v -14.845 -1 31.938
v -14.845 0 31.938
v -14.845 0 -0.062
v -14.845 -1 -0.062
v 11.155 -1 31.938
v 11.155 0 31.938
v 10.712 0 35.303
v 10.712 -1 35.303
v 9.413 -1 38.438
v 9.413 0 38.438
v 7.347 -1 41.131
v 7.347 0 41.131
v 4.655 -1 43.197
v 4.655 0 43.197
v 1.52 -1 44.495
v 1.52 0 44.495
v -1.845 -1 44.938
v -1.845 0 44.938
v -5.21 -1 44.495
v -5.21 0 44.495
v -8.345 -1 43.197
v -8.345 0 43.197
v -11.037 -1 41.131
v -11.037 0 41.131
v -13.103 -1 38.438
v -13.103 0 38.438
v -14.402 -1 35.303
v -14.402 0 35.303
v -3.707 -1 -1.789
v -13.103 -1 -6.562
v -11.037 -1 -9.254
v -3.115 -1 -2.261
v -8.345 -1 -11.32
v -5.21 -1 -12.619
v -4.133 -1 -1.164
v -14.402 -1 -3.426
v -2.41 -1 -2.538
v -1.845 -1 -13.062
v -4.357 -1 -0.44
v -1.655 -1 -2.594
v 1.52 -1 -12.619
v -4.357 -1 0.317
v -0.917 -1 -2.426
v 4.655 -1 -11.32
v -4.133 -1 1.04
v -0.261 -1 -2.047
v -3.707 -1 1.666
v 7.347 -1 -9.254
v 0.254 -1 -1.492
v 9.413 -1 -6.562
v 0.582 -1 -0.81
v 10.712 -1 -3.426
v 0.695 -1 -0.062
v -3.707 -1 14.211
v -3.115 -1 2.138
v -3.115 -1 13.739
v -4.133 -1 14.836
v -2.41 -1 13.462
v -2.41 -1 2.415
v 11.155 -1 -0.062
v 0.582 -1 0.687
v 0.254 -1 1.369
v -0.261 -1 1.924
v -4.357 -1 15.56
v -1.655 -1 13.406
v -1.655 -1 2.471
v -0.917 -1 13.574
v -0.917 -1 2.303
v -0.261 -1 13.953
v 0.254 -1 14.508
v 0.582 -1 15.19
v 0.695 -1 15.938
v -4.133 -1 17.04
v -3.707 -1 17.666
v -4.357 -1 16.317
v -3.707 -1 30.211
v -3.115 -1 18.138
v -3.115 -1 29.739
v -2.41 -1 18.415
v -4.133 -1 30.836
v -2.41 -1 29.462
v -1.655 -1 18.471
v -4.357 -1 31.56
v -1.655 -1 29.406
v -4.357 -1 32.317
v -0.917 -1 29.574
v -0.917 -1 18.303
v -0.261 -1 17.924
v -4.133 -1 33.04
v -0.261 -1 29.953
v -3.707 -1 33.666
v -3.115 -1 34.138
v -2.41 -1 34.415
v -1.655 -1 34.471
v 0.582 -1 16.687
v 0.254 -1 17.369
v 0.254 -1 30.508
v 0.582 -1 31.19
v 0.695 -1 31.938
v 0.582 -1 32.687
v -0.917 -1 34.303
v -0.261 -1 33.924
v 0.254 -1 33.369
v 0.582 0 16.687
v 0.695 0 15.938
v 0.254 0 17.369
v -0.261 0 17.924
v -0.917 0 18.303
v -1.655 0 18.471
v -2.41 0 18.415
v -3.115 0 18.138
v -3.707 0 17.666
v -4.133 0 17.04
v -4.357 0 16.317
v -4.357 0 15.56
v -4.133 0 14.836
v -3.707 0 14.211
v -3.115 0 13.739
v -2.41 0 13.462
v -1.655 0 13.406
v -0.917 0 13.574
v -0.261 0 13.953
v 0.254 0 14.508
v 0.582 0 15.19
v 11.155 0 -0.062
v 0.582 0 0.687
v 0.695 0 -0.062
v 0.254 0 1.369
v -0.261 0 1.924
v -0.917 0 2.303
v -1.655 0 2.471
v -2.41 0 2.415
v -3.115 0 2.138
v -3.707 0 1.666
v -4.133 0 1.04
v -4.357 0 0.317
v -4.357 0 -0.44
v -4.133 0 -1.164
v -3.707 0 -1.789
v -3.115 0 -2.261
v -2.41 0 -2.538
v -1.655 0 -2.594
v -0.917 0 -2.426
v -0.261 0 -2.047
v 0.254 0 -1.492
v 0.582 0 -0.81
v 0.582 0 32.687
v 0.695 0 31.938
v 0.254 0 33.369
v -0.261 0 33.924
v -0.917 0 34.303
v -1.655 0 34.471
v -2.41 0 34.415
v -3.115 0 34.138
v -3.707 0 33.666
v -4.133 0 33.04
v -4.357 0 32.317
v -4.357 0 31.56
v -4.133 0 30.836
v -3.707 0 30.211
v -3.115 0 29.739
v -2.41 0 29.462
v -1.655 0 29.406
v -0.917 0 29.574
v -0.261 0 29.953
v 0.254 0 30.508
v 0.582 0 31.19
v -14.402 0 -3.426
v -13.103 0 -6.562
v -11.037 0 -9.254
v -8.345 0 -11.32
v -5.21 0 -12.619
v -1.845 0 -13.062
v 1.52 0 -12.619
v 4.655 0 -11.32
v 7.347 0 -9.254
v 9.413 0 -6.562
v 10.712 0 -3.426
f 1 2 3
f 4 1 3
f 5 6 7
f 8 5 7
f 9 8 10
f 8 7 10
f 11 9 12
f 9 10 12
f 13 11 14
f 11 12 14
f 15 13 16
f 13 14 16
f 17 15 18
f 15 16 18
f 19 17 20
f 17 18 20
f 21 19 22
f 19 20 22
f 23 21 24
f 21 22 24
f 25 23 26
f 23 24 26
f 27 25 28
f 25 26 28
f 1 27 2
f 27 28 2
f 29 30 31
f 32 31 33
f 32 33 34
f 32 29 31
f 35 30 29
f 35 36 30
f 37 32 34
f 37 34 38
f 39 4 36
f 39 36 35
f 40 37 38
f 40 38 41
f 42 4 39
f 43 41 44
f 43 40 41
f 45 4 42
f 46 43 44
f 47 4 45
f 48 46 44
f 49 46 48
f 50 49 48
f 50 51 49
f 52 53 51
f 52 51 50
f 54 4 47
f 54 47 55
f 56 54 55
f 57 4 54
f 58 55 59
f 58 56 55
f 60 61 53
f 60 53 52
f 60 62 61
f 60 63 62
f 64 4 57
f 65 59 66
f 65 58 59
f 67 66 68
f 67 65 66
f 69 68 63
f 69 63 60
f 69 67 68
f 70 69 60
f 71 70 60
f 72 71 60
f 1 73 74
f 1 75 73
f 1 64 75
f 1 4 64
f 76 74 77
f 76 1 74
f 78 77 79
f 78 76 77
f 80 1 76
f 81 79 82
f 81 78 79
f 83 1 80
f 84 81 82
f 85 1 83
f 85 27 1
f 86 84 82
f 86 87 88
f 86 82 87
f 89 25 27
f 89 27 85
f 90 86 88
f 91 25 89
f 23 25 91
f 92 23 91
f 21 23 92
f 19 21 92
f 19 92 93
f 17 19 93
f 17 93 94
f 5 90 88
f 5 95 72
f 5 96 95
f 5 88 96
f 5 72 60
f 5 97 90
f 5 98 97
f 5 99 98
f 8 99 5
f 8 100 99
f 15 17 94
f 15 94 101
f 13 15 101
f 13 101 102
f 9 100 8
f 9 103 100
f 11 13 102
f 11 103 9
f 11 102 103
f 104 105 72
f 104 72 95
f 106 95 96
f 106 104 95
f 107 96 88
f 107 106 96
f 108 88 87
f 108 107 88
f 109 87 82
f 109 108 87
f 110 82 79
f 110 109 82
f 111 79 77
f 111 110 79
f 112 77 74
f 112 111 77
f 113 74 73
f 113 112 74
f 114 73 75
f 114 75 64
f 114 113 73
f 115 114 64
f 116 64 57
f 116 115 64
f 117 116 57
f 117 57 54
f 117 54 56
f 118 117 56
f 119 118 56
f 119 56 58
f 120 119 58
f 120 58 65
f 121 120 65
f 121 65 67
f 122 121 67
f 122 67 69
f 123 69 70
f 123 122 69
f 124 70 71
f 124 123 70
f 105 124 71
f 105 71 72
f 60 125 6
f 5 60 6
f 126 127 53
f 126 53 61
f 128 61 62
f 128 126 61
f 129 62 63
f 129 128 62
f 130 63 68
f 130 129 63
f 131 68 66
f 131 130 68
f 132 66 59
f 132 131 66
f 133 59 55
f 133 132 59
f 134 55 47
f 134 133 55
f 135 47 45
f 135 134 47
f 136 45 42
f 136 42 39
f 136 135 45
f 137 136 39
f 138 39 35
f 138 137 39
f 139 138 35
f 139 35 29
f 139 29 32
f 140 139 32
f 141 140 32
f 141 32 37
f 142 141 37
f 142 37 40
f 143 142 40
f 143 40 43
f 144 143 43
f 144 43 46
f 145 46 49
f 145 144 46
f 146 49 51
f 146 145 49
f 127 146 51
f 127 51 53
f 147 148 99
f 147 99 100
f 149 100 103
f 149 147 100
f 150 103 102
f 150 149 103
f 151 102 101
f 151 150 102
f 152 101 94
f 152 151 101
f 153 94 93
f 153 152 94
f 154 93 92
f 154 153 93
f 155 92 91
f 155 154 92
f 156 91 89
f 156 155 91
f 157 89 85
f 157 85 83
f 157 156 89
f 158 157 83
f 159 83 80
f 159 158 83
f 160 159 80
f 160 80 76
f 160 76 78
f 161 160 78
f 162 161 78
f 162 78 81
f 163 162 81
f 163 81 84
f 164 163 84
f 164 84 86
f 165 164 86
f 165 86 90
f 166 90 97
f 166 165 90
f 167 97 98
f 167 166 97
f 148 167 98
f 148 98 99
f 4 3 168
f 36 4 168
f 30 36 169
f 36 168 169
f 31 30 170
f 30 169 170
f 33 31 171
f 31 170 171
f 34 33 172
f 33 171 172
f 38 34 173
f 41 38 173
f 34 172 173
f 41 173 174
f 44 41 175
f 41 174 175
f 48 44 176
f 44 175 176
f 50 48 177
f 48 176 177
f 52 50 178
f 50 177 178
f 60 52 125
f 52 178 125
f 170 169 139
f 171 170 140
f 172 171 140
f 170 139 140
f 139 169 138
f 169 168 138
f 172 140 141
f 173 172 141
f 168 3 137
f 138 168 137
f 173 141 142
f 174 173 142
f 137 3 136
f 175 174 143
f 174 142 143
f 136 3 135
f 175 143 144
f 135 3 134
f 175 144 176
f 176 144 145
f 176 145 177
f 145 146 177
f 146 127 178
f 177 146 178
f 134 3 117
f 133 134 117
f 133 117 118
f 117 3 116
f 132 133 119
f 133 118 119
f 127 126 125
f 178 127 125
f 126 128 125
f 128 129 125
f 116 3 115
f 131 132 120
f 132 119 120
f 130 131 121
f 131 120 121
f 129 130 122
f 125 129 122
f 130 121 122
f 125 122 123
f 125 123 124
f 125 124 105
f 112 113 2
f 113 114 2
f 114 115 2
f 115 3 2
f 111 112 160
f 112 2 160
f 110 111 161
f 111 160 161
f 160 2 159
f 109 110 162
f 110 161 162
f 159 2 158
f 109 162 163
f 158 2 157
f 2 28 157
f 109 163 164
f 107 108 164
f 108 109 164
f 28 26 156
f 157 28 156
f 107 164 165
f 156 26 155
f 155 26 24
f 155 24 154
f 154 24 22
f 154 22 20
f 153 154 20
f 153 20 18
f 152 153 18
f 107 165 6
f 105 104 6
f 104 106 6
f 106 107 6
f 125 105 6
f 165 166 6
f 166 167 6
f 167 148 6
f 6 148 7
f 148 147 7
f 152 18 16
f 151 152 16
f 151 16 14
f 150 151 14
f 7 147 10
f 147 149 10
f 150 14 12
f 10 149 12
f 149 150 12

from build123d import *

# Parameters (mm, degrees)
F0_R     = 2.54
F1_DEPTH = 1


with BuildPart() as f1:
    # F0 (on Front) → F1 (new body)
    with BuildSketch(Plane.XZ):
        with BuildLine():
            ThreePointArc((11.155105, 31.938435), (-1.844895, 18.938435), (-14.844895, 31.938435))
            Line((-14.844895, 31.938435), (-14.844895, -0.061565))
            ThreePointArc((-14.844895, -0.061565), (-1.844895, 12.938435), (11.155105, -0.061565))
            Line((11.155105, -0.061565), (11.155105, 31.938435))
        make_face()
        with Locations((-1.844895, 15.938435)):
            Circle(F0_R, mode=Mode.SUBTRACT)
        with BuildLine():
            ThreePointArc((11.155105, 31.938435), (-1.844895, 44.938435), (-14.844895, 31.938435))
            ThreePointArc((-14.844895, 31.938435), (-1.844895, 18.938435), (11.155105, 31.938435))
        make_face()
        with Locations((-1.844895, 31.938435)):
            Circle(F0_R, mode=Mode.SUBTRACT)
        with BuildLine():
            ThreePointArc((11.155105, -0.061565), (-1.844895, 12.938435), (-14.844895, -0.061565))
            ThreePointArc((-14.844895, -0.061565), (-1.844895, -13.061565), (11.155105, -0.061565))
        make_face()
        with Locations((-1.844895, -0.061565)):
            Circle(F0_R, mode=Mode.SUBTRACT)
    extrude(amount=F1_DEPTH)


solid = f1.part
